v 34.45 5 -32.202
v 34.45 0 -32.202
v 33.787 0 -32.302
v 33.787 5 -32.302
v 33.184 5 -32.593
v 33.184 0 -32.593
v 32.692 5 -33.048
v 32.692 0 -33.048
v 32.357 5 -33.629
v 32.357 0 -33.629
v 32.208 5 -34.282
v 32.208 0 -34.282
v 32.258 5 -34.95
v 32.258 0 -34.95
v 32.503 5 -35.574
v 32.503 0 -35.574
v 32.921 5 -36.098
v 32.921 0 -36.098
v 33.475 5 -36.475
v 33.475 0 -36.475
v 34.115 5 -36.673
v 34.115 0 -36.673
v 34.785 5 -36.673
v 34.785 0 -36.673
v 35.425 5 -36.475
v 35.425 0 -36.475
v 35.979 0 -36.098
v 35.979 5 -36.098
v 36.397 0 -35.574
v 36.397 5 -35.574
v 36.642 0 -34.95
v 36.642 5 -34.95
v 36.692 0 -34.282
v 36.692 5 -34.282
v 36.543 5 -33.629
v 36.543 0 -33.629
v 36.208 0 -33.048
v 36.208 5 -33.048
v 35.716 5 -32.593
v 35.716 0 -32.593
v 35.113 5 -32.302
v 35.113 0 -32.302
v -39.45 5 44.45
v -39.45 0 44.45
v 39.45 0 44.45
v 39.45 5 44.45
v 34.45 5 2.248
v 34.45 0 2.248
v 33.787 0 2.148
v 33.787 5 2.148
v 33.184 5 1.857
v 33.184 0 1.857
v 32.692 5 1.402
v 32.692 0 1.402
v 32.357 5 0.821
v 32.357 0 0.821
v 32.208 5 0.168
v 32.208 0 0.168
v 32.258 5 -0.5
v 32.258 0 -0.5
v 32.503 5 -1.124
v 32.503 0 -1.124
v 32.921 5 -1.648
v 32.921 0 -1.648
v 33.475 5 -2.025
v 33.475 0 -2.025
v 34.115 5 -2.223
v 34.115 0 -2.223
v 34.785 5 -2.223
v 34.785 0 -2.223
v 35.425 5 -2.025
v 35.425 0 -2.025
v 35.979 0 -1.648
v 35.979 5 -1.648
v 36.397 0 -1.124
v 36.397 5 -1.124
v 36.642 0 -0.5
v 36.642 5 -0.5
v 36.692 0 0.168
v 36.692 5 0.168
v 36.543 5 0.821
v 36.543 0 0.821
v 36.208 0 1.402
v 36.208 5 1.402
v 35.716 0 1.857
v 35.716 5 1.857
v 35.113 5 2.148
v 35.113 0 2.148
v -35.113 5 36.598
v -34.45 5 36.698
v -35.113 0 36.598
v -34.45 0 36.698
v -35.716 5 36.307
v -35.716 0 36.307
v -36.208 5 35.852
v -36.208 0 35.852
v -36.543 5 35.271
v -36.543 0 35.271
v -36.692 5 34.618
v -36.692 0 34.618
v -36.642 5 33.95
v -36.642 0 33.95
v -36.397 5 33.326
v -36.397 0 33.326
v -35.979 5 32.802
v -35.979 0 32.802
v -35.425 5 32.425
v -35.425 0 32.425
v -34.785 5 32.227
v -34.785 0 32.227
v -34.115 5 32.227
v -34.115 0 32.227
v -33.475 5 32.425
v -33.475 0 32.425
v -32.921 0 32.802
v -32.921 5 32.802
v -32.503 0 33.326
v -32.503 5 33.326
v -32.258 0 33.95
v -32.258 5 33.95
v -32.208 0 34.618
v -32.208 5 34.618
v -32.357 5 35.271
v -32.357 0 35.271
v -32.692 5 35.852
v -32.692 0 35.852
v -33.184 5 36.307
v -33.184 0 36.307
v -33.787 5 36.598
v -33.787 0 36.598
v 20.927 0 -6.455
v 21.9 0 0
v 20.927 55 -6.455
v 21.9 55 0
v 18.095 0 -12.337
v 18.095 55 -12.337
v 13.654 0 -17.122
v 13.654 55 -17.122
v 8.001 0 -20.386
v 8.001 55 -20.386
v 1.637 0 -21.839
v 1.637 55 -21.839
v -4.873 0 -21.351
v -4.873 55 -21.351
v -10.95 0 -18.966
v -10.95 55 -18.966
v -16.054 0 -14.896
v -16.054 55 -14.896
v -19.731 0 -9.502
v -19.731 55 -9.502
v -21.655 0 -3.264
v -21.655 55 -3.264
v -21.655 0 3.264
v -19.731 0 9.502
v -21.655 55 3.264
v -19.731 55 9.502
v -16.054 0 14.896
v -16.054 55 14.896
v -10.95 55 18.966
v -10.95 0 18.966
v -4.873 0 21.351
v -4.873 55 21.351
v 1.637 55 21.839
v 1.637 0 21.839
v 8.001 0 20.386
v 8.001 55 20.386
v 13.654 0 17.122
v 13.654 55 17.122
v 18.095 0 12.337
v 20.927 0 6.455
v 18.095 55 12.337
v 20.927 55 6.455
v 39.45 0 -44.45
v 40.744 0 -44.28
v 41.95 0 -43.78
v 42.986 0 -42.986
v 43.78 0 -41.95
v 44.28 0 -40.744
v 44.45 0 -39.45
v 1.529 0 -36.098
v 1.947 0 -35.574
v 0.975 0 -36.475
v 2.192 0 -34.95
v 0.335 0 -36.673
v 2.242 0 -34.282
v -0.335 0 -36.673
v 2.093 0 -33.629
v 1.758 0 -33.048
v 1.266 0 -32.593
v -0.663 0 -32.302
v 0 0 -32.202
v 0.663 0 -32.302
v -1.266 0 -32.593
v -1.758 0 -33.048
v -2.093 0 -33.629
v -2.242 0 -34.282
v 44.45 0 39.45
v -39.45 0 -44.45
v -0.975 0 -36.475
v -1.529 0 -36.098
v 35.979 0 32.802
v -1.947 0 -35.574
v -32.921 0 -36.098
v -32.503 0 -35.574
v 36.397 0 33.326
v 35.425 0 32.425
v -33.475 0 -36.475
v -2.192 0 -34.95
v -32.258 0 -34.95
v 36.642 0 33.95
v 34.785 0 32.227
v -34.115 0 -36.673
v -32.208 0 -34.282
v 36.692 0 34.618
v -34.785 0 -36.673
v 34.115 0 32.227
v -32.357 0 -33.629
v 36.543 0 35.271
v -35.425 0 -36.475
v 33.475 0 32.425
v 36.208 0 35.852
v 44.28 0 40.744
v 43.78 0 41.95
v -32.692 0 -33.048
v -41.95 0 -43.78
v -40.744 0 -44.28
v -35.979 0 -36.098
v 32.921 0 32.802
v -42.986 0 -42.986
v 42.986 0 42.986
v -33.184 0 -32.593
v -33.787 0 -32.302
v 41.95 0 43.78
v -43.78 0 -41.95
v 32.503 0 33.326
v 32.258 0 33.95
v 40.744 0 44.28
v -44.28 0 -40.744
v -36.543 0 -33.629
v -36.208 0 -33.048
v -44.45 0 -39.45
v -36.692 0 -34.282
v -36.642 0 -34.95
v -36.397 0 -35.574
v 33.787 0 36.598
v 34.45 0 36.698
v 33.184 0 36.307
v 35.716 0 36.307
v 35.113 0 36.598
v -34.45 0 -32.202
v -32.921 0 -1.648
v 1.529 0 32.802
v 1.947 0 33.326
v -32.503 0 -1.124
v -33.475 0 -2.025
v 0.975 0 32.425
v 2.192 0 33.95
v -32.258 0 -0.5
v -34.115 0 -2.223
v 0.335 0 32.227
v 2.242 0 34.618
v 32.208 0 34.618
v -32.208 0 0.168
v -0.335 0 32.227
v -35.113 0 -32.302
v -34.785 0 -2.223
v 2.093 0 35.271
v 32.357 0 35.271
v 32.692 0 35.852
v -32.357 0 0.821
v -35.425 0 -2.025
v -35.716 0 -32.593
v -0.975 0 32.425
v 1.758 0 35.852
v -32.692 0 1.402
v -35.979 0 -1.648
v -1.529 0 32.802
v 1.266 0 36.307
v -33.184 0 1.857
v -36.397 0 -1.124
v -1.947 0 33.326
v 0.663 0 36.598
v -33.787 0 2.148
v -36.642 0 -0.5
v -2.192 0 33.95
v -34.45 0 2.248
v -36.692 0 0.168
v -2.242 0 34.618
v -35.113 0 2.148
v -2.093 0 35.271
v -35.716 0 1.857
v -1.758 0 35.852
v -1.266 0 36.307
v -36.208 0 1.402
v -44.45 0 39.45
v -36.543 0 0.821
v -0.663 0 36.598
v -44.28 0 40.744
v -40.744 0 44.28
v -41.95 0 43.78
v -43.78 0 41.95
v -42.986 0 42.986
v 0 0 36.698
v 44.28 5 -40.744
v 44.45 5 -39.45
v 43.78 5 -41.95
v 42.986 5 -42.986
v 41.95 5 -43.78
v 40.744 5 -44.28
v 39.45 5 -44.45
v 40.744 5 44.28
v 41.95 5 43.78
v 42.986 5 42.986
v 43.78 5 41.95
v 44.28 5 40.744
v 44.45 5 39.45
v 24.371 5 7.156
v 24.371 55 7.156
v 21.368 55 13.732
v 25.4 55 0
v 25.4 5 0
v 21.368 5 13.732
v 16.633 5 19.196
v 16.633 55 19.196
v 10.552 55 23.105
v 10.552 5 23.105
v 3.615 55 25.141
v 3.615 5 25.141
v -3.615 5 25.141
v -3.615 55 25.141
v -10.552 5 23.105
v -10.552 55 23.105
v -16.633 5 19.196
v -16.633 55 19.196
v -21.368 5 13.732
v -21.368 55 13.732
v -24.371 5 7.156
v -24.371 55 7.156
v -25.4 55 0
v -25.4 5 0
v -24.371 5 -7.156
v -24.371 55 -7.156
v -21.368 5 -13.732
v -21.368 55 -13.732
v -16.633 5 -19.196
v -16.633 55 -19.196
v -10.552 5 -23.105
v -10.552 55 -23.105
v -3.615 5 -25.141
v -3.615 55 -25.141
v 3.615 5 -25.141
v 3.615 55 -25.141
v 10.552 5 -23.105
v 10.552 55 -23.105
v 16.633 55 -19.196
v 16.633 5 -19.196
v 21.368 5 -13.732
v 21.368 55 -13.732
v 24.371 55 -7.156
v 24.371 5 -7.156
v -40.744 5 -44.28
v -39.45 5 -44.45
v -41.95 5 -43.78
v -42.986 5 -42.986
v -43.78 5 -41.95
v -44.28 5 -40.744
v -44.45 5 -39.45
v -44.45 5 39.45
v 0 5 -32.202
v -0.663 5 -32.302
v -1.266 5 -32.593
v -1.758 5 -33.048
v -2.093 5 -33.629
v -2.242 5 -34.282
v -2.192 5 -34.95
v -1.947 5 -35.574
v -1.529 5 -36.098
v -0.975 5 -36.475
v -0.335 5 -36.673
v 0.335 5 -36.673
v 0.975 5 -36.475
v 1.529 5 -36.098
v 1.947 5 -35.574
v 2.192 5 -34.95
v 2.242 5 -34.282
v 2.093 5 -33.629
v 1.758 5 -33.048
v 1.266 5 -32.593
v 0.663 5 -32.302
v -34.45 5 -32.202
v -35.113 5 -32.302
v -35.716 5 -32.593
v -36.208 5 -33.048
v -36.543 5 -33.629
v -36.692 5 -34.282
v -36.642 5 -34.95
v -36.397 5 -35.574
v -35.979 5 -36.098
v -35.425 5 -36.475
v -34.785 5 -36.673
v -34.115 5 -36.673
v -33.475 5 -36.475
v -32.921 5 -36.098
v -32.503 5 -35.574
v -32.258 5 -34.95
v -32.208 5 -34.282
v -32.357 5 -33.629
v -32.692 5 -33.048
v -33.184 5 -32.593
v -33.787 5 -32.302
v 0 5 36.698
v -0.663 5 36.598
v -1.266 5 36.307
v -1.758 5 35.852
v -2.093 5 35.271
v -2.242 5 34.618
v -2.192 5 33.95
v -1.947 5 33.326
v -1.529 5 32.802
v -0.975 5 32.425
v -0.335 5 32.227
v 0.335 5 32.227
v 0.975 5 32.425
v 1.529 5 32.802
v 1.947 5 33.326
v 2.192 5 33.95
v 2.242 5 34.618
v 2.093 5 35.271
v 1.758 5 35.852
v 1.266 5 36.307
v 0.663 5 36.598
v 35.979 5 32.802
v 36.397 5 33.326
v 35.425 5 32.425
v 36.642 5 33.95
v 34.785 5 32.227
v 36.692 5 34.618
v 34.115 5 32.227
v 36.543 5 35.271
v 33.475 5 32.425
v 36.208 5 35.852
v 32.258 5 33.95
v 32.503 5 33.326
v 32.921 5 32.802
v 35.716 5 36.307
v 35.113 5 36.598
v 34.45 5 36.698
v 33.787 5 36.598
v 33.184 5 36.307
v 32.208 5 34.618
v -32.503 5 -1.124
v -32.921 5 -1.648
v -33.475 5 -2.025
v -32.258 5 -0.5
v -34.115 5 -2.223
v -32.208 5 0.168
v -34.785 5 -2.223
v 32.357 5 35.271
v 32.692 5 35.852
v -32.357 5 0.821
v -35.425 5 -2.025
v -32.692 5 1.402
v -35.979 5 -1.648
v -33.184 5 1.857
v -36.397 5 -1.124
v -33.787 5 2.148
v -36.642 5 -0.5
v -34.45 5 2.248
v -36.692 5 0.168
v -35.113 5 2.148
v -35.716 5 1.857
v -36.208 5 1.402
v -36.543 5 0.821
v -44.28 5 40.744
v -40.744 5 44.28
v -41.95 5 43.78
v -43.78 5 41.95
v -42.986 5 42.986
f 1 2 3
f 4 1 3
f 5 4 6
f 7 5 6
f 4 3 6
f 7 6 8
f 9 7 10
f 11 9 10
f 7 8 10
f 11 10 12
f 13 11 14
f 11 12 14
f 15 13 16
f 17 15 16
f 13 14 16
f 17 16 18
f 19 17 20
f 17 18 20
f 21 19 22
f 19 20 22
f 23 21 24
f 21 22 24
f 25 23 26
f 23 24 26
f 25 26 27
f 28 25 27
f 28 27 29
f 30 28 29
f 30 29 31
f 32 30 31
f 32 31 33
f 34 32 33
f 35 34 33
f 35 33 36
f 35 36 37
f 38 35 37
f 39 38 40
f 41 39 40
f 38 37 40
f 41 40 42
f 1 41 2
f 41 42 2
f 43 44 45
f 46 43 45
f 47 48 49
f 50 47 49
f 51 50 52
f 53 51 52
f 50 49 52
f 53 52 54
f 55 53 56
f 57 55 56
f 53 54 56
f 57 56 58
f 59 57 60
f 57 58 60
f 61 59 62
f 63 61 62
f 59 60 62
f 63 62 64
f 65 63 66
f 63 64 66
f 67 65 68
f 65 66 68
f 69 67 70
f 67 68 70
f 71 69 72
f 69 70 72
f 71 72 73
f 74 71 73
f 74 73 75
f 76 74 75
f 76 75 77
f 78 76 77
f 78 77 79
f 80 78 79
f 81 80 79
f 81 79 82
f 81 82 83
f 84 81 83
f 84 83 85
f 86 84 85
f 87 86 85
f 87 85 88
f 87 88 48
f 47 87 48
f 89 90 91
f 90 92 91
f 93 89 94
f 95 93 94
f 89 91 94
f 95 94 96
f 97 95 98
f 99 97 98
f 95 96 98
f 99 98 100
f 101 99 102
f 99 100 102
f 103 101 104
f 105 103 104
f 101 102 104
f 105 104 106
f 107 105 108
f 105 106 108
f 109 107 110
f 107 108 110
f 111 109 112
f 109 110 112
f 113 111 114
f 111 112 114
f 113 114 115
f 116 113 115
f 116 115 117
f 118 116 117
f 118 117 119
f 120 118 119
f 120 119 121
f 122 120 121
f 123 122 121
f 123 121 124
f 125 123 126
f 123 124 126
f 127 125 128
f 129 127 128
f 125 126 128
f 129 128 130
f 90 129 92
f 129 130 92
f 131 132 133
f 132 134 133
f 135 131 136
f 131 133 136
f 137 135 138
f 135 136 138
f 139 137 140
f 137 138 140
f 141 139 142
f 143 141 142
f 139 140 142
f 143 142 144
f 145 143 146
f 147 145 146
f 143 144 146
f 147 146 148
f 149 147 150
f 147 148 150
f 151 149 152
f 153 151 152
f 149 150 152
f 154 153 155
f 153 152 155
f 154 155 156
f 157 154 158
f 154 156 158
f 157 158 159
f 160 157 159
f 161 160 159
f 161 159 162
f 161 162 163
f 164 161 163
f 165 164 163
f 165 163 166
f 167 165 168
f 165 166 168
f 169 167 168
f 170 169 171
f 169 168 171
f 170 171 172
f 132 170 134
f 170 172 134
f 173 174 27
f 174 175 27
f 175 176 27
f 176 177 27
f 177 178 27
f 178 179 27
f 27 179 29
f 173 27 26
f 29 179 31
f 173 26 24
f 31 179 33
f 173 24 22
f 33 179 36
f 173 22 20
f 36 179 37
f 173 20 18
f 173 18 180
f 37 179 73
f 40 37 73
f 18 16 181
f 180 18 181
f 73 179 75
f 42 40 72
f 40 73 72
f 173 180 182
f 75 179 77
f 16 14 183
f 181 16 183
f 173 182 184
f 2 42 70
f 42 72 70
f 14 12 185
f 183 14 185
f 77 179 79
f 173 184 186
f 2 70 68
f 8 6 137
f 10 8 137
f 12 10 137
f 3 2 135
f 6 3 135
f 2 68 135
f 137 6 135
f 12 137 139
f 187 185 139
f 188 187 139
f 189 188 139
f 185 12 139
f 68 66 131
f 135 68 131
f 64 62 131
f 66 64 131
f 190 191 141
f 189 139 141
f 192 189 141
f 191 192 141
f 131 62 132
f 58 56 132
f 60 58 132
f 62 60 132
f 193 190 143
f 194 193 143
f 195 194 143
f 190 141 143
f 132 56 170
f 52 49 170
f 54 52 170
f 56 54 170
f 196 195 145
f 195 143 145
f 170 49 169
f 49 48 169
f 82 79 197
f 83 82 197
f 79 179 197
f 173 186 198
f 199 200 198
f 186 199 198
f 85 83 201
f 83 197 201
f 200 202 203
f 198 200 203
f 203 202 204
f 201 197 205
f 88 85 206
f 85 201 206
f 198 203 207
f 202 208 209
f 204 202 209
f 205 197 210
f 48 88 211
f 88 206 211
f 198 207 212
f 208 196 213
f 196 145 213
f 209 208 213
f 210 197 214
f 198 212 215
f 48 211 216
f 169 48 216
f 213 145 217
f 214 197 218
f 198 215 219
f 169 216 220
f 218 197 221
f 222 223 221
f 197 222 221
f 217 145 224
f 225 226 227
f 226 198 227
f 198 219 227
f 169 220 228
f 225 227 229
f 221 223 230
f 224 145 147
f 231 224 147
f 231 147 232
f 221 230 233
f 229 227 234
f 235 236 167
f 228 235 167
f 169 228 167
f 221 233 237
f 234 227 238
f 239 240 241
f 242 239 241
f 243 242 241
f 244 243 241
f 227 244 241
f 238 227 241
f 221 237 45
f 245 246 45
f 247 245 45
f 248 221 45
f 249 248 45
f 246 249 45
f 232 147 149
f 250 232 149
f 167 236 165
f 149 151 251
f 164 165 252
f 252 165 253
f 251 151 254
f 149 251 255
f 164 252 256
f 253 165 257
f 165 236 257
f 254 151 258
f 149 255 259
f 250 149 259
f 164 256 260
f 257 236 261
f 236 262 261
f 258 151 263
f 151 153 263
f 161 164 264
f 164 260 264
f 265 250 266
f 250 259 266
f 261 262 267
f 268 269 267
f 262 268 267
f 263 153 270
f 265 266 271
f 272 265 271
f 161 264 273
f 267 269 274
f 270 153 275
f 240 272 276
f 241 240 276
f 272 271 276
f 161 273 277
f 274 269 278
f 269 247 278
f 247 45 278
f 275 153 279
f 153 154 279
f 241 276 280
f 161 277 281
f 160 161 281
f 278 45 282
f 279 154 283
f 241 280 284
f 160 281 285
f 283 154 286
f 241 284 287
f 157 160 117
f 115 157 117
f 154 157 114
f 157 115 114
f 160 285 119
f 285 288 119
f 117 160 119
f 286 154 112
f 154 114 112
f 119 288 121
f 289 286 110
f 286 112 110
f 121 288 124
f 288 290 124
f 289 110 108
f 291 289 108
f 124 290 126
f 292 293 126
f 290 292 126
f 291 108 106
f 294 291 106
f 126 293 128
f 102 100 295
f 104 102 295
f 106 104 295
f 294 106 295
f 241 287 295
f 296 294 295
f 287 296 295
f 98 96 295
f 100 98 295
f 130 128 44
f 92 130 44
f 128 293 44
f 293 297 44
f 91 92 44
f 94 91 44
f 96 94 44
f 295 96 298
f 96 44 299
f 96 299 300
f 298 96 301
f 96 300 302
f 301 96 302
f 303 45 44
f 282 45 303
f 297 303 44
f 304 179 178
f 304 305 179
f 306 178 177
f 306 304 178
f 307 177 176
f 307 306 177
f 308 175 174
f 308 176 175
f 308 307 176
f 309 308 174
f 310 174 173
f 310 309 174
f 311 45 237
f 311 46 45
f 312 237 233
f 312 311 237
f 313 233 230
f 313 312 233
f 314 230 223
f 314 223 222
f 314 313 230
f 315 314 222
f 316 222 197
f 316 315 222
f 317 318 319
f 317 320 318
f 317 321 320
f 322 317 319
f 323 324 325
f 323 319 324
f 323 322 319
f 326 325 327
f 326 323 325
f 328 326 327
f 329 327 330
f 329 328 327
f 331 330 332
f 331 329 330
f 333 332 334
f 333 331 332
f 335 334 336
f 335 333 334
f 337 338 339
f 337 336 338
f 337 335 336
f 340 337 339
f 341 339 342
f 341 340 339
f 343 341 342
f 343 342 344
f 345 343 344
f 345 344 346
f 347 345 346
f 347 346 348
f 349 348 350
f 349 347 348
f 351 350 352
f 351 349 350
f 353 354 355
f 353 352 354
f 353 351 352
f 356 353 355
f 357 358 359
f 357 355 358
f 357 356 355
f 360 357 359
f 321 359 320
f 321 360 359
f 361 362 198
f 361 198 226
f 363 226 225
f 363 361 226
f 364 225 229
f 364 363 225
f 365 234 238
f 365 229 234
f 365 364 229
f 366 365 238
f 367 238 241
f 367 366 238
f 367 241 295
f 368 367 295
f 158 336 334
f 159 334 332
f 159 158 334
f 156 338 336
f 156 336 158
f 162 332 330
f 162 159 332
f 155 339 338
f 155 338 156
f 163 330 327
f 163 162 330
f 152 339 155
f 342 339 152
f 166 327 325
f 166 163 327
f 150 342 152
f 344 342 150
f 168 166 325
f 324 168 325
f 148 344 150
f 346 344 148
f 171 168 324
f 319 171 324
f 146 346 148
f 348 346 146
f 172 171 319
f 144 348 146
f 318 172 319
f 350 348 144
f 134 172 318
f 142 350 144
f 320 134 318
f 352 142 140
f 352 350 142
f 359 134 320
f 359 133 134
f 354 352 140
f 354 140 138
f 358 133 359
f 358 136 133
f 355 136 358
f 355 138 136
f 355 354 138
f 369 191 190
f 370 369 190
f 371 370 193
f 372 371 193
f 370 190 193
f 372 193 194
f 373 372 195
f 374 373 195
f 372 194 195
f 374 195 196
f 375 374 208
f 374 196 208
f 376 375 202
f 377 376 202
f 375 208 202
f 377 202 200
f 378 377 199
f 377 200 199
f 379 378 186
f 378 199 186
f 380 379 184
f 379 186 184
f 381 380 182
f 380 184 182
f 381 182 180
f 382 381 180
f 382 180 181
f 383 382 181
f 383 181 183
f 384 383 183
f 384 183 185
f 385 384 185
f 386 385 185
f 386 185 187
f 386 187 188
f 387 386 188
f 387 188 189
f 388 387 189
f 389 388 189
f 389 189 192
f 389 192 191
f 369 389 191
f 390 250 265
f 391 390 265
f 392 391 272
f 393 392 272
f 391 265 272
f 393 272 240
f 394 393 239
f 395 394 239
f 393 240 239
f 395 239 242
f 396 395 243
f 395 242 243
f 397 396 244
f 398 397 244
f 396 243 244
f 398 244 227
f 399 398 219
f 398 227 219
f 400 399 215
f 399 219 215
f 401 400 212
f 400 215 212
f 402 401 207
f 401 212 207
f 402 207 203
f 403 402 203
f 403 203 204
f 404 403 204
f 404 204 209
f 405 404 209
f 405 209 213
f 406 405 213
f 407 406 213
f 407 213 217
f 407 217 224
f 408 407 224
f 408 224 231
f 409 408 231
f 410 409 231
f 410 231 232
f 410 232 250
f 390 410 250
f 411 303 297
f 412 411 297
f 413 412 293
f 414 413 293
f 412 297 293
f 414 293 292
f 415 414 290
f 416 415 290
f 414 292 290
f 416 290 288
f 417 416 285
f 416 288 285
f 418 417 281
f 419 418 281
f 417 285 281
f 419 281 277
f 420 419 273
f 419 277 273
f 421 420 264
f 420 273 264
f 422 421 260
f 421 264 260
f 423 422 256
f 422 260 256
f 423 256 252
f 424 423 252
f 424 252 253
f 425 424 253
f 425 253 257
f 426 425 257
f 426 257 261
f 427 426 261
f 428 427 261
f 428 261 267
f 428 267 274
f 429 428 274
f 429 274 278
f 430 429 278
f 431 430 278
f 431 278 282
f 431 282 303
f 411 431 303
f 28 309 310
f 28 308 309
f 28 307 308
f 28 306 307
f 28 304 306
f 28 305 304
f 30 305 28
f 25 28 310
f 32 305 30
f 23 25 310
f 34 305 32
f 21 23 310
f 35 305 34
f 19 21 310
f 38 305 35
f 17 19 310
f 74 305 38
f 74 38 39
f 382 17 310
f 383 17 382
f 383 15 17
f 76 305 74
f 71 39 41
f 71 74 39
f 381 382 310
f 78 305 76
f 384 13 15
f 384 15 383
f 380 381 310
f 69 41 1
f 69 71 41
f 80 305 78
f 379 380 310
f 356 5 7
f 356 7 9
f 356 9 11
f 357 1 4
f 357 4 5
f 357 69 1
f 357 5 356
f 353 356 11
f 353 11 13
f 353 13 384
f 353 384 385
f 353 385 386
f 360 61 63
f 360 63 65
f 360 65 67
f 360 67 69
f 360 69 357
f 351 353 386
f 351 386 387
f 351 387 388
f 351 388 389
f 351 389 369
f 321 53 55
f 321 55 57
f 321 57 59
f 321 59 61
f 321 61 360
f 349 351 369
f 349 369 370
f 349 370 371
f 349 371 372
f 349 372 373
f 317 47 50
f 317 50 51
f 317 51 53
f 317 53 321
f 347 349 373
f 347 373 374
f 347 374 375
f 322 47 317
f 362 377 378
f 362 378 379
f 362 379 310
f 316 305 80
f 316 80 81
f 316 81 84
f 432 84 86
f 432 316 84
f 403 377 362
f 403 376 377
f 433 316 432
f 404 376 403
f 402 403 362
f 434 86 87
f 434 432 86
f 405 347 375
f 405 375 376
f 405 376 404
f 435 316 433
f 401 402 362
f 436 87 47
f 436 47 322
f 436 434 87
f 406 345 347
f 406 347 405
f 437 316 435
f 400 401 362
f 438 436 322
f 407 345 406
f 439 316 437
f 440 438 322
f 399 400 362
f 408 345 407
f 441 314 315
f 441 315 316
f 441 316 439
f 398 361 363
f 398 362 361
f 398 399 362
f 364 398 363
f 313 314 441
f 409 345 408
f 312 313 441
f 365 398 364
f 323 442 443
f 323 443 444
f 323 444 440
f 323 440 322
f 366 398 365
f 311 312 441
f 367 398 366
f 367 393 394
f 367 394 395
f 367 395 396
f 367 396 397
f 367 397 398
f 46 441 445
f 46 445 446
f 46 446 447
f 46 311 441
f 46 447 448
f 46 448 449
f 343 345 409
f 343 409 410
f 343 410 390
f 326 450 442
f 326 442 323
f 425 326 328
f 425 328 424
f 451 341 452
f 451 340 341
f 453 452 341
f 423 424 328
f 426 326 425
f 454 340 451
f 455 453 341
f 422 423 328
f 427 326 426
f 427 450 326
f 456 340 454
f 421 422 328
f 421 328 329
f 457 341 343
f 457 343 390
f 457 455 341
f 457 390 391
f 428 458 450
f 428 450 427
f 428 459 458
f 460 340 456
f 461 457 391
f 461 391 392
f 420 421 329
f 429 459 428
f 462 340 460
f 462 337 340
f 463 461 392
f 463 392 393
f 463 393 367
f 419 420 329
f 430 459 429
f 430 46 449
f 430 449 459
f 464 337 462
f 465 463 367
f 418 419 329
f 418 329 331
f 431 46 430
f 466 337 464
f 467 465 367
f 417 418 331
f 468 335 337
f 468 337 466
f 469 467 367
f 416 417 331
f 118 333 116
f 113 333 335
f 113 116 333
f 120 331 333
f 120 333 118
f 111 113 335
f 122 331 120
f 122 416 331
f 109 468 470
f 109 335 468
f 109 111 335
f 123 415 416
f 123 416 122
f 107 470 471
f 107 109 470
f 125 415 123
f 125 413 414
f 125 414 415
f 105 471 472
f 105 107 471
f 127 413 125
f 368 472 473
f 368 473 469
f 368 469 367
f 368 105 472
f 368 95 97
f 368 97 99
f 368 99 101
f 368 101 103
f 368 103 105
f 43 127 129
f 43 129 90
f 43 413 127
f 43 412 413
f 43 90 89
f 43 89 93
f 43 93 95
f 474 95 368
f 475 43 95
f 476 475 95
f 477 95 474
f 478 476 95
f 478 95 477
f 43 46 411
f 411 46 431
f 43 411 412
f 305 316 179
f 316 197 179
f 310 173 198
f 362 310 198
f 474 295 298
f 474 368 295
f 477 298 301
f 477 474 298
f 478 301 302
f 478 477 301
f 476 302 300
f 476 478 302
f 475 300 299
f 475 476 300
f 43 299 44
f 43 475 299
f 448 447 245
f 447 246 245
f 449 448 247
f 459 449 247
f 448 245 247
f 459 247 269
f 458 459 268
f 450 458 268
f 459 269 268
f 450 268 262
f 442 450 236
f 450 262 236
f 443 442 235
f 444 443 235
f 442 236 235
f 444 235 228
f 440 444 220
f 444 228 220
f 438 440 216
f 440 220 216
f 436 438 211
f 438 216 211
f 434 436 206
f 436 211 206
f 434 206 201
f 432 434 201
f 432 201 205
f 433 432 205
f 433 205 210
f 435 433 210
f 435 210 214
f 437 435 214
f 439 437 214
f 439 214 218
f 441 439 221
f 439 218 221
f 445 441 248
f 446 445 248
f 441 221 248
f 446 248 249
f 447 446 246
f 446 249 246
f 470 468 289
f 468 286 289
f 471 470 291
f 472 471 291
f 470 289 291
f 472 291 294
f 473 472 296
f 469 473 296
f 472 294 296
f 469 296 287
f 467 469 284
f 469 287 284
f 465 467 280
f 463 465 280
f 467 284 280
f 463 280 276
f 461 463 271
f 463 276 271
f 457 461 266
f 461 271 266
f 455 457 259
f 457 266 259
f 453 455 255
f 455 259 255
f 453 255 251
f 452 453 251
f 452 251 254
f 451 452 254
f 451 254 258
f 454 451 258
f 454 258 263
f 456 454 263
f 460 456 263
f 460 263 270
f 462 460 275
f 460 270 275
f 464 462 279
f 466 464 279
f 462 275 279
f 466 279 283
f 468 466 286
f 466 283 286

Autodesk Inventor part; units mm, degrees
ref_plane "YZ Plane" through (0, 0, 0) normal (1, 0, 0) x (0, 1, 0)
ref_plane "XZ Plane" through (0, 0, 0) normal (0, 1, 0) x (-1, 0, 0)
ref_plane "XY Plane" through (0, 0, 0) normal (0, 0, 1) x (1, 0, 0)
sketch "Sketch1" plane through (0, 0, 0) normal (0, 1, 0) x (-1, 0, 0)
  line L0 (44.45, 44.45) -> (-44.45, 44.45)
  line L1 (-44.45, 44.45) -> (-44.45, -44.45)
  line L2 (-44.45, -44.45) -> (44.45, -44.45)
  line L3 (44.45, -44.45) -> (44.45, 44.45)
  line L4 (44.45, 44.45) -> (-44.45, -44.45) construction
  line L5 (-44.45, 44.45) -> (44.45, -44.45) construction
  point P0 (0, 0)
  dimension "d0" = 88.9
  dimension "d1" = 88.9
extrude "Extrusion1" add sketch "Sketch1" along normal blind 5
sketch "Sketch2" plane through (0, 5, 0) normal (0, 1, 0) x (1, 0, 0)
  circle A0 centre (0, 0) radius 25.4
  dimension "d4" = 50.8
extrude "Extrusion2" add sketch "Sketch2" along normal blind 50
sketch "Sketch3" plane through (0, 5, 0) normal (0, 1, 0) x (1, 0, 0)
  line L0 (44.45, 44.45) -> (-44.45, 44.45) projected
  line L1 (-44.45, 44.45) -> (-44.45, -44.45) projected
  line L2 (44.45, -44.45) -> (44.45, 44.45) projected
  line L3 (-44.45, -44.45) -> (44.45, -44.45) projected
  point P0 (0, 0)
  point P1 (-34.45, 34.45)
  point P2 (0, 34.45)
  point P3 (34.45, 34.45)
  point P4 (34.45, 0)
  point P5 (34.45, -34.45)
  point P6 (0, -34.45)
  point P7 (-34.45, -34.45)
  point P8 (-34.45, 0)
  dimension "d14" = 10
  dimension "d15" = 10
  dimension "d16" = 10
  dimension "d17" = 0
  dimension "d18" = 10
  dimension "d19" = 10
  dimension "d20" = 10
  dimension "d21" = 0
  dimension "d22" = 10
  dimension "d23" = 10
  dimension "d24" = 10
  dimension "d25" = 0
  dimension "d26" = 10
  dimension "d27" = 10
  dimension "d28" = 10
  dimension "d29" = 0
hole "Hole1" at (-34.45, 5, -34.45) at (0, 5, -34.45) at (34.45, 5, -34.45) at (34.45, 5, 0) at (34.45, 5, 34.45) at (0, 5, 34.45) at (-34.45, 5, 34.45) at (-34.45, 5, 0) direction (0, -1, 0) diameter 4.496 end through all clearance for "Socket Head Cap Screw" size "#8" standard "Ansi Unified Screw Threads"
sketch "Sketch4" plane through (0, 55, 0) normal (0, 1, 0) x (1, 0, 0)
  circle A0 centre (0, 0) radius 21.9
  dimension "d30" = 43.8
extrude "Extrusion3" cut sketch "Sketch4" against normal up to next
fillet "Fillet1" radius 5 4 edges at (-44.45, 2.5, 44.45) (44.45, 2.5, 44.45) (44.45, 2.5, -44.45) (-44.45, 2.5, -44.45)
properties part number "duct_mount"
